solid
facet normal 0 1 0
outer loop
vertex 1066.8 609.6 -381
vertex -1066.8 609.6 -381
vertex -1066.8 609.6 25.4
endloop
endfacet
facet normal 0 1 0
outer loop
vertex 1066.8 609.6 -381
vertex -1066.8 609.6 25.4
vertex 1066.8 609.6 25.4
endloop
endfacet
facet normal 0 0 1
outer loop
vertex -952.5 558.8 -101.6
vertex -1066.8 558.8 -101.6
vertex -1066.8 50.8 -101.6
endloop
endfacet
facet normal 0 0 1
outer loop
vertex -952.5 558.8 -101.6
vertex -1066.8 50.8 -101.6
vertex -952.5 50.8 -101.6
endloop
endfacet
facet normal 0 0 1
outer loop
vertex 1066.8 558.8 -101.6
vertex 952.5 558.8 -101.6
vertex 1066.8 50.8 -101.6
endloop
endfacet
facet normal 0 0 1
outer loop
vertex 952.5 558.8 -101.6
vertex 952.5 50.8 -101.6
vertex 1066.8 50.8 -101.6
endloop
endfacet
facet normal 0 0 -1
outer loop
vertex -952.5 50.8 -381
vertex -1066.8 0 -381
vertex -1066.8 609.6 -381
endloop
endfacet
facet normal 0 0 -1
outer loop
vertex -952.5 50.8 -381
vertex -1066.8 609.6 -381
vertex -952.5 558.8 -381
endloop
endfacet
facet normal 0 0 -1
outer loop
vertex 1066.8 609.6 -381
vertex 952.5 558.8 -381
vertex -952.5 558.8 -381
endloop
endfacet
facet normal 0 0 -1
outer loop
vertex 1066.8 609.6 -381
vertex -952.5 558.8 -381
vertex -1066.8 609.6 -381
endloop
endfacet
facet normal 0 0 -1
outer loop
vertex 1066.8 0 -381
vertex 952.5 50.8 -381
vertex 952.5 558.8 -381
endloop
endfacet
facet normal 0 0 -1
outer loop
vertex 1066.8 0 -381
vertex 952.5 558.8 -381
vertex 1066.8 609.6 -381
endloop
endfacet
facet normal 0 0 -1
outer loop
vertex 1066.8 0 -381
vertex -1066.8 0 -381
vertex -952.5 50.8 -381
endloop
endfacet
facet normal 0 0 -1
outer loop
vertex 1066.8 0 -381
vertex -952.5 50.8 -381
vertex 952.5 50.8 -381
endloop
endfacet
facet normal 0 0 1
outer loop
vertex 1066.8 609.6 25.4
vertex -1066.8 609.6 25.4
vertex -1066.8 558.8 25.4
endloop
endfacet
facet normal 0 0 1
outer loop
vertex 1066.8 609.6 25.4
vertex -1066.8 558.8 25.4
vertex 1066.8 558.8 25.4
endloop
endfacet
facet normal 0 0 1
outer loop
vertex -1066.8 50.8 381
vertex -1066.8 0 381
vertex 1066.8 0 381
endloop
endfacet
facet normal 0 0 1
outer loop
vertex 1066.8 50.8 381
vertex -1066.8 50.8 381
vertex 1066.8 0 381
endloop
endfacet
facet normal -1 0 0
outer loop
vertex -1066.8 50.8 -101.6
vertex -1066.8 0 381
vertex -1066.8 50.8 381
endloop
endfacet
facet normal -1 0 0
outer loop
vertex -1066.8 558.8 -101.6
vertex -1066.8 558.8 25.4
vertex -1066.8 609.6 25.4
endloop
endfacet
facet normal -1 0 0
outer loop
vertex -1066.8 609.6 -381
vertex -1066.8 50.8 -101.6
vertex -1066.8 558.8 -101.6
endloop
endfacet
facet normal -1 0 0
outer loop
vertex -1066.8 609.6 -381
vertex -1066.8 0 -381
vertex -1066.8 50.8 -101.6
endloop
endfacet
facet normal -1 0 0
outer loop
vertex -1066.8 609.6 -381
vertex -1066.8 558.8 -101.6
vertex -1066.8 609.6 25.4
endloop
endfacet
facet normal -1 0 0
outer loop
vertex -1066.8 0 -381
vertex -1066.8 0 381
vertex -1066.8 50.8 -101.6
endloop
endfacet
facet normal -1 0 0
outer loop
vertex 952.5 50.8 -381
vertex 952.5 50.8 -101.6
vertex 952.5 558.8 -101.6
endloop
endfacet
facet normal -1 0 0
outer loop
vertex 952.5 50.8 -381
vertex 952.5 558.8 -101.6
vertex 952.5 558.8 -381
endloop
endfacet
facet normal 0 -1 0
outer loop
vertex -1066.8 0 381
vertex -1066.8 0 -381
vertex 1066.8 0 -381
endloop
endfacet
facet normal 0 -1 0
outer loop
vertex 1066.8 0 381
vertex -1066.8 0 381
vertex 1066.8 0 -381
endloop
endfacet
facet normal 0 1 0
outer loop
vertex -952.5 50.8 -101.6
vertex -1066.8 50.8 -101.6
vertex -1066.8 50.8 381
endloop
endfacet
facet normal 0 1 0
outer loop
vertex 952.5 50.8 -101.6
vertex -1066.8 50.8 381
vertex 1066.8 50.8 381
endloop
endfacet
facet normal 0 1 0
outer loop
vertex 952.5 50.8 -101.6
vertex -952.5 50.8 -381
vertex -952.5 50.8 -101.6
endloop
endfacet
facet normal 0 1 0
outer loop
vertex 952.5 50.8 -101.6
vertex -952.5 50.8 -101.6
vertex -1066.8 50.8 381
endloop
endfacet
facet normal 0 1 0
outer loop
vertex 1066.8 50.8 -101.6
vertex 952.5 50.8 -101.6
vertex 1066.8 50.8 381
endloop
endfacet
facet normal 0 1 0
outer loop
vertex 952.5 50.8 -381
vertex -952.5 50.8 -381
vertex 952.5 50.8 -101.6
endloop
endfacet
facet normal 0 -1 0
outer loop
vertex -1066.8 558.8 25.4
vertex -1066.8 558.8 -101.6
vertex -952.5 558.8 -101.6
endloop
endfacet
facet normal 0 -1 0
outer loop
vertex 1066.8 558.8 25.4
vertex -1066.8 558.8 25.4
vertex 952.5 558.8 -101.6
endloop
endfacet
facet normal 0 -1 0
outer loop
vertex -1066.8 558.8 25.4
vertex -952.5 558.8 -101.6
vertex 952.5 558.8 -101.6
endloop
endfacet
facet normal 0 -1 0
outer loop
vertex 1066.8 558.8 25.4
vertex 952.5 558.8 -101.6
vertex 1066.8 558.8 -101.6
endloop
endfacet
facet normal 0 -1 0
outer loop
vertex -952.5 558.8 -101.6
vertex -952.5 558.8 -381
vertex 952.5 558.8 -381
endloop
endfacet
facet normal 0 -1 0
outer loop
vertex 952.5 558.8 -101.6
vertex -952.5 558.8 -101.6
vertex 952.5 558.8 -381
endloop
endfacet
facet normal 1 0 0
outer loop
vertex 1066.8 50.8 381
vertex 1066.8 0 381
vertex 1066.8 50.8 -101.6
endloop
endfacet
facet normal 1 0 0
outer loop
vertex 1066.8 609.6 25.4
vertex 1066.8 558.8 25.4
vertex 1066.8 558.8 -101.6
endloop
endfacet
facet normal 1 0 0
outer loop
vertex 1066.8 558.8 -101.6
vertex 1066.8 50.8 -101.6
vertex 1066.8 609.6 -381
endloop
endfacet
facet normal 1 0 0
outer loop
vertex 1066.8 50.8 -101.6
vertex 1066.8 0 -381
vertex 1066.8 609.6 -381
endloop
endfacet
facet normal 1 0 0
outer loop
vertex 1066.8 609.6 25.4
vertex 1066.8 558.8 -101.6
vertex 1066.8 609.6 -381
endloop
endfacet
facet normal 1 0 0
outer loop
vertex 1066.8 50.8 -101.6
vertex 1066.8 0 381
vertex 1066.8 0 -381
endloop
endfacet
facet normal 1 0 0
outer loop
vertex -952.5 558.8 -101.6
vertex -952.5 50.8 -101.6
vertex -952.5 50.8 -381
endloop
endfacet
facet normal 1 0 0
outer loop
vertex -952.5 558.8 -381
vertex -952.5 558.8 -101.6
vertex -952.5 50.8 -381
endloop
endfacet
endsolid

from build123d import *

# Parameters (mm, degrees)
SKETCH1_W           = 2133.6
SKETCH1_H           = 762
BOSS_EXTRUDE1_DEPTH = 50.8
SKETCH3_W           = 114.3
SKETCH3_H           = 279.4
BOSS_EXTRUDE2_DEPTH = 508
SKETCH4_W           = 2133.6
SKETCH4_H           = 279.4
BOSS_EXTRUDE3_DEPTH = 50.8
SKETCH5_W           = 2133.6
SKETCH5_H           = 50.8
BOSS_EXTRUDE4_DEPTH = 127


with BuildPart() as part:
    # Sketch1 → Boss-Extrude1 (new body)
    with BuildSketch(Plane(origin=(0, 0, 0), x_dir=(1, 0, 0), z_dir=(0, 1, 0))):
        Rectangle(SKETCH1_W, SKETCH1_H)
    extrude(amount=BOSS_EXTRUDE1_DEPTH)

    # Sketch3 → Boss-Extrude2 (add)
    with BuildSketch(Plane(origin=(0, 50.8, 0), x_dir=(1, 0, 0), z_dir=(0, 1, 0))):
        with Locations((-1009.65, 241.3)):
            Rectangle(SKETCH3_W, SKETCH3_H)
        with Locations((1009.65, 241.3)):
            Rectangle(SKETCH3_W, SKETCH3_H)
    extrude(amount=BOSS_EXTRUDE2_DEPTH)

    # Sketch4 → Boss-Extrude3 (add)
    with BuildSketch(Plane(origin=(0, 558.8, 0), x_dir=(1, 0, 0), z_dir=(0, 1, 0))):
        with Locations((0, 241.3)):
            Rectangle(SKETCH4_W, SKETCH4_H)
    extrude(amount=BOSS_EXTRUDE3_DEPTH)

    # Sketch5 → Boss-Extrude4 (add)
    with BuildSketch(Plane.XY.offset(-101.6)):
        with Locations((0, 584.2)):
            Rectangle(SKETCH5_W, SKETCH5_H)
    extrude(amount=BOSS_EXTRUDE4_DEPTH)


solid = part.part
